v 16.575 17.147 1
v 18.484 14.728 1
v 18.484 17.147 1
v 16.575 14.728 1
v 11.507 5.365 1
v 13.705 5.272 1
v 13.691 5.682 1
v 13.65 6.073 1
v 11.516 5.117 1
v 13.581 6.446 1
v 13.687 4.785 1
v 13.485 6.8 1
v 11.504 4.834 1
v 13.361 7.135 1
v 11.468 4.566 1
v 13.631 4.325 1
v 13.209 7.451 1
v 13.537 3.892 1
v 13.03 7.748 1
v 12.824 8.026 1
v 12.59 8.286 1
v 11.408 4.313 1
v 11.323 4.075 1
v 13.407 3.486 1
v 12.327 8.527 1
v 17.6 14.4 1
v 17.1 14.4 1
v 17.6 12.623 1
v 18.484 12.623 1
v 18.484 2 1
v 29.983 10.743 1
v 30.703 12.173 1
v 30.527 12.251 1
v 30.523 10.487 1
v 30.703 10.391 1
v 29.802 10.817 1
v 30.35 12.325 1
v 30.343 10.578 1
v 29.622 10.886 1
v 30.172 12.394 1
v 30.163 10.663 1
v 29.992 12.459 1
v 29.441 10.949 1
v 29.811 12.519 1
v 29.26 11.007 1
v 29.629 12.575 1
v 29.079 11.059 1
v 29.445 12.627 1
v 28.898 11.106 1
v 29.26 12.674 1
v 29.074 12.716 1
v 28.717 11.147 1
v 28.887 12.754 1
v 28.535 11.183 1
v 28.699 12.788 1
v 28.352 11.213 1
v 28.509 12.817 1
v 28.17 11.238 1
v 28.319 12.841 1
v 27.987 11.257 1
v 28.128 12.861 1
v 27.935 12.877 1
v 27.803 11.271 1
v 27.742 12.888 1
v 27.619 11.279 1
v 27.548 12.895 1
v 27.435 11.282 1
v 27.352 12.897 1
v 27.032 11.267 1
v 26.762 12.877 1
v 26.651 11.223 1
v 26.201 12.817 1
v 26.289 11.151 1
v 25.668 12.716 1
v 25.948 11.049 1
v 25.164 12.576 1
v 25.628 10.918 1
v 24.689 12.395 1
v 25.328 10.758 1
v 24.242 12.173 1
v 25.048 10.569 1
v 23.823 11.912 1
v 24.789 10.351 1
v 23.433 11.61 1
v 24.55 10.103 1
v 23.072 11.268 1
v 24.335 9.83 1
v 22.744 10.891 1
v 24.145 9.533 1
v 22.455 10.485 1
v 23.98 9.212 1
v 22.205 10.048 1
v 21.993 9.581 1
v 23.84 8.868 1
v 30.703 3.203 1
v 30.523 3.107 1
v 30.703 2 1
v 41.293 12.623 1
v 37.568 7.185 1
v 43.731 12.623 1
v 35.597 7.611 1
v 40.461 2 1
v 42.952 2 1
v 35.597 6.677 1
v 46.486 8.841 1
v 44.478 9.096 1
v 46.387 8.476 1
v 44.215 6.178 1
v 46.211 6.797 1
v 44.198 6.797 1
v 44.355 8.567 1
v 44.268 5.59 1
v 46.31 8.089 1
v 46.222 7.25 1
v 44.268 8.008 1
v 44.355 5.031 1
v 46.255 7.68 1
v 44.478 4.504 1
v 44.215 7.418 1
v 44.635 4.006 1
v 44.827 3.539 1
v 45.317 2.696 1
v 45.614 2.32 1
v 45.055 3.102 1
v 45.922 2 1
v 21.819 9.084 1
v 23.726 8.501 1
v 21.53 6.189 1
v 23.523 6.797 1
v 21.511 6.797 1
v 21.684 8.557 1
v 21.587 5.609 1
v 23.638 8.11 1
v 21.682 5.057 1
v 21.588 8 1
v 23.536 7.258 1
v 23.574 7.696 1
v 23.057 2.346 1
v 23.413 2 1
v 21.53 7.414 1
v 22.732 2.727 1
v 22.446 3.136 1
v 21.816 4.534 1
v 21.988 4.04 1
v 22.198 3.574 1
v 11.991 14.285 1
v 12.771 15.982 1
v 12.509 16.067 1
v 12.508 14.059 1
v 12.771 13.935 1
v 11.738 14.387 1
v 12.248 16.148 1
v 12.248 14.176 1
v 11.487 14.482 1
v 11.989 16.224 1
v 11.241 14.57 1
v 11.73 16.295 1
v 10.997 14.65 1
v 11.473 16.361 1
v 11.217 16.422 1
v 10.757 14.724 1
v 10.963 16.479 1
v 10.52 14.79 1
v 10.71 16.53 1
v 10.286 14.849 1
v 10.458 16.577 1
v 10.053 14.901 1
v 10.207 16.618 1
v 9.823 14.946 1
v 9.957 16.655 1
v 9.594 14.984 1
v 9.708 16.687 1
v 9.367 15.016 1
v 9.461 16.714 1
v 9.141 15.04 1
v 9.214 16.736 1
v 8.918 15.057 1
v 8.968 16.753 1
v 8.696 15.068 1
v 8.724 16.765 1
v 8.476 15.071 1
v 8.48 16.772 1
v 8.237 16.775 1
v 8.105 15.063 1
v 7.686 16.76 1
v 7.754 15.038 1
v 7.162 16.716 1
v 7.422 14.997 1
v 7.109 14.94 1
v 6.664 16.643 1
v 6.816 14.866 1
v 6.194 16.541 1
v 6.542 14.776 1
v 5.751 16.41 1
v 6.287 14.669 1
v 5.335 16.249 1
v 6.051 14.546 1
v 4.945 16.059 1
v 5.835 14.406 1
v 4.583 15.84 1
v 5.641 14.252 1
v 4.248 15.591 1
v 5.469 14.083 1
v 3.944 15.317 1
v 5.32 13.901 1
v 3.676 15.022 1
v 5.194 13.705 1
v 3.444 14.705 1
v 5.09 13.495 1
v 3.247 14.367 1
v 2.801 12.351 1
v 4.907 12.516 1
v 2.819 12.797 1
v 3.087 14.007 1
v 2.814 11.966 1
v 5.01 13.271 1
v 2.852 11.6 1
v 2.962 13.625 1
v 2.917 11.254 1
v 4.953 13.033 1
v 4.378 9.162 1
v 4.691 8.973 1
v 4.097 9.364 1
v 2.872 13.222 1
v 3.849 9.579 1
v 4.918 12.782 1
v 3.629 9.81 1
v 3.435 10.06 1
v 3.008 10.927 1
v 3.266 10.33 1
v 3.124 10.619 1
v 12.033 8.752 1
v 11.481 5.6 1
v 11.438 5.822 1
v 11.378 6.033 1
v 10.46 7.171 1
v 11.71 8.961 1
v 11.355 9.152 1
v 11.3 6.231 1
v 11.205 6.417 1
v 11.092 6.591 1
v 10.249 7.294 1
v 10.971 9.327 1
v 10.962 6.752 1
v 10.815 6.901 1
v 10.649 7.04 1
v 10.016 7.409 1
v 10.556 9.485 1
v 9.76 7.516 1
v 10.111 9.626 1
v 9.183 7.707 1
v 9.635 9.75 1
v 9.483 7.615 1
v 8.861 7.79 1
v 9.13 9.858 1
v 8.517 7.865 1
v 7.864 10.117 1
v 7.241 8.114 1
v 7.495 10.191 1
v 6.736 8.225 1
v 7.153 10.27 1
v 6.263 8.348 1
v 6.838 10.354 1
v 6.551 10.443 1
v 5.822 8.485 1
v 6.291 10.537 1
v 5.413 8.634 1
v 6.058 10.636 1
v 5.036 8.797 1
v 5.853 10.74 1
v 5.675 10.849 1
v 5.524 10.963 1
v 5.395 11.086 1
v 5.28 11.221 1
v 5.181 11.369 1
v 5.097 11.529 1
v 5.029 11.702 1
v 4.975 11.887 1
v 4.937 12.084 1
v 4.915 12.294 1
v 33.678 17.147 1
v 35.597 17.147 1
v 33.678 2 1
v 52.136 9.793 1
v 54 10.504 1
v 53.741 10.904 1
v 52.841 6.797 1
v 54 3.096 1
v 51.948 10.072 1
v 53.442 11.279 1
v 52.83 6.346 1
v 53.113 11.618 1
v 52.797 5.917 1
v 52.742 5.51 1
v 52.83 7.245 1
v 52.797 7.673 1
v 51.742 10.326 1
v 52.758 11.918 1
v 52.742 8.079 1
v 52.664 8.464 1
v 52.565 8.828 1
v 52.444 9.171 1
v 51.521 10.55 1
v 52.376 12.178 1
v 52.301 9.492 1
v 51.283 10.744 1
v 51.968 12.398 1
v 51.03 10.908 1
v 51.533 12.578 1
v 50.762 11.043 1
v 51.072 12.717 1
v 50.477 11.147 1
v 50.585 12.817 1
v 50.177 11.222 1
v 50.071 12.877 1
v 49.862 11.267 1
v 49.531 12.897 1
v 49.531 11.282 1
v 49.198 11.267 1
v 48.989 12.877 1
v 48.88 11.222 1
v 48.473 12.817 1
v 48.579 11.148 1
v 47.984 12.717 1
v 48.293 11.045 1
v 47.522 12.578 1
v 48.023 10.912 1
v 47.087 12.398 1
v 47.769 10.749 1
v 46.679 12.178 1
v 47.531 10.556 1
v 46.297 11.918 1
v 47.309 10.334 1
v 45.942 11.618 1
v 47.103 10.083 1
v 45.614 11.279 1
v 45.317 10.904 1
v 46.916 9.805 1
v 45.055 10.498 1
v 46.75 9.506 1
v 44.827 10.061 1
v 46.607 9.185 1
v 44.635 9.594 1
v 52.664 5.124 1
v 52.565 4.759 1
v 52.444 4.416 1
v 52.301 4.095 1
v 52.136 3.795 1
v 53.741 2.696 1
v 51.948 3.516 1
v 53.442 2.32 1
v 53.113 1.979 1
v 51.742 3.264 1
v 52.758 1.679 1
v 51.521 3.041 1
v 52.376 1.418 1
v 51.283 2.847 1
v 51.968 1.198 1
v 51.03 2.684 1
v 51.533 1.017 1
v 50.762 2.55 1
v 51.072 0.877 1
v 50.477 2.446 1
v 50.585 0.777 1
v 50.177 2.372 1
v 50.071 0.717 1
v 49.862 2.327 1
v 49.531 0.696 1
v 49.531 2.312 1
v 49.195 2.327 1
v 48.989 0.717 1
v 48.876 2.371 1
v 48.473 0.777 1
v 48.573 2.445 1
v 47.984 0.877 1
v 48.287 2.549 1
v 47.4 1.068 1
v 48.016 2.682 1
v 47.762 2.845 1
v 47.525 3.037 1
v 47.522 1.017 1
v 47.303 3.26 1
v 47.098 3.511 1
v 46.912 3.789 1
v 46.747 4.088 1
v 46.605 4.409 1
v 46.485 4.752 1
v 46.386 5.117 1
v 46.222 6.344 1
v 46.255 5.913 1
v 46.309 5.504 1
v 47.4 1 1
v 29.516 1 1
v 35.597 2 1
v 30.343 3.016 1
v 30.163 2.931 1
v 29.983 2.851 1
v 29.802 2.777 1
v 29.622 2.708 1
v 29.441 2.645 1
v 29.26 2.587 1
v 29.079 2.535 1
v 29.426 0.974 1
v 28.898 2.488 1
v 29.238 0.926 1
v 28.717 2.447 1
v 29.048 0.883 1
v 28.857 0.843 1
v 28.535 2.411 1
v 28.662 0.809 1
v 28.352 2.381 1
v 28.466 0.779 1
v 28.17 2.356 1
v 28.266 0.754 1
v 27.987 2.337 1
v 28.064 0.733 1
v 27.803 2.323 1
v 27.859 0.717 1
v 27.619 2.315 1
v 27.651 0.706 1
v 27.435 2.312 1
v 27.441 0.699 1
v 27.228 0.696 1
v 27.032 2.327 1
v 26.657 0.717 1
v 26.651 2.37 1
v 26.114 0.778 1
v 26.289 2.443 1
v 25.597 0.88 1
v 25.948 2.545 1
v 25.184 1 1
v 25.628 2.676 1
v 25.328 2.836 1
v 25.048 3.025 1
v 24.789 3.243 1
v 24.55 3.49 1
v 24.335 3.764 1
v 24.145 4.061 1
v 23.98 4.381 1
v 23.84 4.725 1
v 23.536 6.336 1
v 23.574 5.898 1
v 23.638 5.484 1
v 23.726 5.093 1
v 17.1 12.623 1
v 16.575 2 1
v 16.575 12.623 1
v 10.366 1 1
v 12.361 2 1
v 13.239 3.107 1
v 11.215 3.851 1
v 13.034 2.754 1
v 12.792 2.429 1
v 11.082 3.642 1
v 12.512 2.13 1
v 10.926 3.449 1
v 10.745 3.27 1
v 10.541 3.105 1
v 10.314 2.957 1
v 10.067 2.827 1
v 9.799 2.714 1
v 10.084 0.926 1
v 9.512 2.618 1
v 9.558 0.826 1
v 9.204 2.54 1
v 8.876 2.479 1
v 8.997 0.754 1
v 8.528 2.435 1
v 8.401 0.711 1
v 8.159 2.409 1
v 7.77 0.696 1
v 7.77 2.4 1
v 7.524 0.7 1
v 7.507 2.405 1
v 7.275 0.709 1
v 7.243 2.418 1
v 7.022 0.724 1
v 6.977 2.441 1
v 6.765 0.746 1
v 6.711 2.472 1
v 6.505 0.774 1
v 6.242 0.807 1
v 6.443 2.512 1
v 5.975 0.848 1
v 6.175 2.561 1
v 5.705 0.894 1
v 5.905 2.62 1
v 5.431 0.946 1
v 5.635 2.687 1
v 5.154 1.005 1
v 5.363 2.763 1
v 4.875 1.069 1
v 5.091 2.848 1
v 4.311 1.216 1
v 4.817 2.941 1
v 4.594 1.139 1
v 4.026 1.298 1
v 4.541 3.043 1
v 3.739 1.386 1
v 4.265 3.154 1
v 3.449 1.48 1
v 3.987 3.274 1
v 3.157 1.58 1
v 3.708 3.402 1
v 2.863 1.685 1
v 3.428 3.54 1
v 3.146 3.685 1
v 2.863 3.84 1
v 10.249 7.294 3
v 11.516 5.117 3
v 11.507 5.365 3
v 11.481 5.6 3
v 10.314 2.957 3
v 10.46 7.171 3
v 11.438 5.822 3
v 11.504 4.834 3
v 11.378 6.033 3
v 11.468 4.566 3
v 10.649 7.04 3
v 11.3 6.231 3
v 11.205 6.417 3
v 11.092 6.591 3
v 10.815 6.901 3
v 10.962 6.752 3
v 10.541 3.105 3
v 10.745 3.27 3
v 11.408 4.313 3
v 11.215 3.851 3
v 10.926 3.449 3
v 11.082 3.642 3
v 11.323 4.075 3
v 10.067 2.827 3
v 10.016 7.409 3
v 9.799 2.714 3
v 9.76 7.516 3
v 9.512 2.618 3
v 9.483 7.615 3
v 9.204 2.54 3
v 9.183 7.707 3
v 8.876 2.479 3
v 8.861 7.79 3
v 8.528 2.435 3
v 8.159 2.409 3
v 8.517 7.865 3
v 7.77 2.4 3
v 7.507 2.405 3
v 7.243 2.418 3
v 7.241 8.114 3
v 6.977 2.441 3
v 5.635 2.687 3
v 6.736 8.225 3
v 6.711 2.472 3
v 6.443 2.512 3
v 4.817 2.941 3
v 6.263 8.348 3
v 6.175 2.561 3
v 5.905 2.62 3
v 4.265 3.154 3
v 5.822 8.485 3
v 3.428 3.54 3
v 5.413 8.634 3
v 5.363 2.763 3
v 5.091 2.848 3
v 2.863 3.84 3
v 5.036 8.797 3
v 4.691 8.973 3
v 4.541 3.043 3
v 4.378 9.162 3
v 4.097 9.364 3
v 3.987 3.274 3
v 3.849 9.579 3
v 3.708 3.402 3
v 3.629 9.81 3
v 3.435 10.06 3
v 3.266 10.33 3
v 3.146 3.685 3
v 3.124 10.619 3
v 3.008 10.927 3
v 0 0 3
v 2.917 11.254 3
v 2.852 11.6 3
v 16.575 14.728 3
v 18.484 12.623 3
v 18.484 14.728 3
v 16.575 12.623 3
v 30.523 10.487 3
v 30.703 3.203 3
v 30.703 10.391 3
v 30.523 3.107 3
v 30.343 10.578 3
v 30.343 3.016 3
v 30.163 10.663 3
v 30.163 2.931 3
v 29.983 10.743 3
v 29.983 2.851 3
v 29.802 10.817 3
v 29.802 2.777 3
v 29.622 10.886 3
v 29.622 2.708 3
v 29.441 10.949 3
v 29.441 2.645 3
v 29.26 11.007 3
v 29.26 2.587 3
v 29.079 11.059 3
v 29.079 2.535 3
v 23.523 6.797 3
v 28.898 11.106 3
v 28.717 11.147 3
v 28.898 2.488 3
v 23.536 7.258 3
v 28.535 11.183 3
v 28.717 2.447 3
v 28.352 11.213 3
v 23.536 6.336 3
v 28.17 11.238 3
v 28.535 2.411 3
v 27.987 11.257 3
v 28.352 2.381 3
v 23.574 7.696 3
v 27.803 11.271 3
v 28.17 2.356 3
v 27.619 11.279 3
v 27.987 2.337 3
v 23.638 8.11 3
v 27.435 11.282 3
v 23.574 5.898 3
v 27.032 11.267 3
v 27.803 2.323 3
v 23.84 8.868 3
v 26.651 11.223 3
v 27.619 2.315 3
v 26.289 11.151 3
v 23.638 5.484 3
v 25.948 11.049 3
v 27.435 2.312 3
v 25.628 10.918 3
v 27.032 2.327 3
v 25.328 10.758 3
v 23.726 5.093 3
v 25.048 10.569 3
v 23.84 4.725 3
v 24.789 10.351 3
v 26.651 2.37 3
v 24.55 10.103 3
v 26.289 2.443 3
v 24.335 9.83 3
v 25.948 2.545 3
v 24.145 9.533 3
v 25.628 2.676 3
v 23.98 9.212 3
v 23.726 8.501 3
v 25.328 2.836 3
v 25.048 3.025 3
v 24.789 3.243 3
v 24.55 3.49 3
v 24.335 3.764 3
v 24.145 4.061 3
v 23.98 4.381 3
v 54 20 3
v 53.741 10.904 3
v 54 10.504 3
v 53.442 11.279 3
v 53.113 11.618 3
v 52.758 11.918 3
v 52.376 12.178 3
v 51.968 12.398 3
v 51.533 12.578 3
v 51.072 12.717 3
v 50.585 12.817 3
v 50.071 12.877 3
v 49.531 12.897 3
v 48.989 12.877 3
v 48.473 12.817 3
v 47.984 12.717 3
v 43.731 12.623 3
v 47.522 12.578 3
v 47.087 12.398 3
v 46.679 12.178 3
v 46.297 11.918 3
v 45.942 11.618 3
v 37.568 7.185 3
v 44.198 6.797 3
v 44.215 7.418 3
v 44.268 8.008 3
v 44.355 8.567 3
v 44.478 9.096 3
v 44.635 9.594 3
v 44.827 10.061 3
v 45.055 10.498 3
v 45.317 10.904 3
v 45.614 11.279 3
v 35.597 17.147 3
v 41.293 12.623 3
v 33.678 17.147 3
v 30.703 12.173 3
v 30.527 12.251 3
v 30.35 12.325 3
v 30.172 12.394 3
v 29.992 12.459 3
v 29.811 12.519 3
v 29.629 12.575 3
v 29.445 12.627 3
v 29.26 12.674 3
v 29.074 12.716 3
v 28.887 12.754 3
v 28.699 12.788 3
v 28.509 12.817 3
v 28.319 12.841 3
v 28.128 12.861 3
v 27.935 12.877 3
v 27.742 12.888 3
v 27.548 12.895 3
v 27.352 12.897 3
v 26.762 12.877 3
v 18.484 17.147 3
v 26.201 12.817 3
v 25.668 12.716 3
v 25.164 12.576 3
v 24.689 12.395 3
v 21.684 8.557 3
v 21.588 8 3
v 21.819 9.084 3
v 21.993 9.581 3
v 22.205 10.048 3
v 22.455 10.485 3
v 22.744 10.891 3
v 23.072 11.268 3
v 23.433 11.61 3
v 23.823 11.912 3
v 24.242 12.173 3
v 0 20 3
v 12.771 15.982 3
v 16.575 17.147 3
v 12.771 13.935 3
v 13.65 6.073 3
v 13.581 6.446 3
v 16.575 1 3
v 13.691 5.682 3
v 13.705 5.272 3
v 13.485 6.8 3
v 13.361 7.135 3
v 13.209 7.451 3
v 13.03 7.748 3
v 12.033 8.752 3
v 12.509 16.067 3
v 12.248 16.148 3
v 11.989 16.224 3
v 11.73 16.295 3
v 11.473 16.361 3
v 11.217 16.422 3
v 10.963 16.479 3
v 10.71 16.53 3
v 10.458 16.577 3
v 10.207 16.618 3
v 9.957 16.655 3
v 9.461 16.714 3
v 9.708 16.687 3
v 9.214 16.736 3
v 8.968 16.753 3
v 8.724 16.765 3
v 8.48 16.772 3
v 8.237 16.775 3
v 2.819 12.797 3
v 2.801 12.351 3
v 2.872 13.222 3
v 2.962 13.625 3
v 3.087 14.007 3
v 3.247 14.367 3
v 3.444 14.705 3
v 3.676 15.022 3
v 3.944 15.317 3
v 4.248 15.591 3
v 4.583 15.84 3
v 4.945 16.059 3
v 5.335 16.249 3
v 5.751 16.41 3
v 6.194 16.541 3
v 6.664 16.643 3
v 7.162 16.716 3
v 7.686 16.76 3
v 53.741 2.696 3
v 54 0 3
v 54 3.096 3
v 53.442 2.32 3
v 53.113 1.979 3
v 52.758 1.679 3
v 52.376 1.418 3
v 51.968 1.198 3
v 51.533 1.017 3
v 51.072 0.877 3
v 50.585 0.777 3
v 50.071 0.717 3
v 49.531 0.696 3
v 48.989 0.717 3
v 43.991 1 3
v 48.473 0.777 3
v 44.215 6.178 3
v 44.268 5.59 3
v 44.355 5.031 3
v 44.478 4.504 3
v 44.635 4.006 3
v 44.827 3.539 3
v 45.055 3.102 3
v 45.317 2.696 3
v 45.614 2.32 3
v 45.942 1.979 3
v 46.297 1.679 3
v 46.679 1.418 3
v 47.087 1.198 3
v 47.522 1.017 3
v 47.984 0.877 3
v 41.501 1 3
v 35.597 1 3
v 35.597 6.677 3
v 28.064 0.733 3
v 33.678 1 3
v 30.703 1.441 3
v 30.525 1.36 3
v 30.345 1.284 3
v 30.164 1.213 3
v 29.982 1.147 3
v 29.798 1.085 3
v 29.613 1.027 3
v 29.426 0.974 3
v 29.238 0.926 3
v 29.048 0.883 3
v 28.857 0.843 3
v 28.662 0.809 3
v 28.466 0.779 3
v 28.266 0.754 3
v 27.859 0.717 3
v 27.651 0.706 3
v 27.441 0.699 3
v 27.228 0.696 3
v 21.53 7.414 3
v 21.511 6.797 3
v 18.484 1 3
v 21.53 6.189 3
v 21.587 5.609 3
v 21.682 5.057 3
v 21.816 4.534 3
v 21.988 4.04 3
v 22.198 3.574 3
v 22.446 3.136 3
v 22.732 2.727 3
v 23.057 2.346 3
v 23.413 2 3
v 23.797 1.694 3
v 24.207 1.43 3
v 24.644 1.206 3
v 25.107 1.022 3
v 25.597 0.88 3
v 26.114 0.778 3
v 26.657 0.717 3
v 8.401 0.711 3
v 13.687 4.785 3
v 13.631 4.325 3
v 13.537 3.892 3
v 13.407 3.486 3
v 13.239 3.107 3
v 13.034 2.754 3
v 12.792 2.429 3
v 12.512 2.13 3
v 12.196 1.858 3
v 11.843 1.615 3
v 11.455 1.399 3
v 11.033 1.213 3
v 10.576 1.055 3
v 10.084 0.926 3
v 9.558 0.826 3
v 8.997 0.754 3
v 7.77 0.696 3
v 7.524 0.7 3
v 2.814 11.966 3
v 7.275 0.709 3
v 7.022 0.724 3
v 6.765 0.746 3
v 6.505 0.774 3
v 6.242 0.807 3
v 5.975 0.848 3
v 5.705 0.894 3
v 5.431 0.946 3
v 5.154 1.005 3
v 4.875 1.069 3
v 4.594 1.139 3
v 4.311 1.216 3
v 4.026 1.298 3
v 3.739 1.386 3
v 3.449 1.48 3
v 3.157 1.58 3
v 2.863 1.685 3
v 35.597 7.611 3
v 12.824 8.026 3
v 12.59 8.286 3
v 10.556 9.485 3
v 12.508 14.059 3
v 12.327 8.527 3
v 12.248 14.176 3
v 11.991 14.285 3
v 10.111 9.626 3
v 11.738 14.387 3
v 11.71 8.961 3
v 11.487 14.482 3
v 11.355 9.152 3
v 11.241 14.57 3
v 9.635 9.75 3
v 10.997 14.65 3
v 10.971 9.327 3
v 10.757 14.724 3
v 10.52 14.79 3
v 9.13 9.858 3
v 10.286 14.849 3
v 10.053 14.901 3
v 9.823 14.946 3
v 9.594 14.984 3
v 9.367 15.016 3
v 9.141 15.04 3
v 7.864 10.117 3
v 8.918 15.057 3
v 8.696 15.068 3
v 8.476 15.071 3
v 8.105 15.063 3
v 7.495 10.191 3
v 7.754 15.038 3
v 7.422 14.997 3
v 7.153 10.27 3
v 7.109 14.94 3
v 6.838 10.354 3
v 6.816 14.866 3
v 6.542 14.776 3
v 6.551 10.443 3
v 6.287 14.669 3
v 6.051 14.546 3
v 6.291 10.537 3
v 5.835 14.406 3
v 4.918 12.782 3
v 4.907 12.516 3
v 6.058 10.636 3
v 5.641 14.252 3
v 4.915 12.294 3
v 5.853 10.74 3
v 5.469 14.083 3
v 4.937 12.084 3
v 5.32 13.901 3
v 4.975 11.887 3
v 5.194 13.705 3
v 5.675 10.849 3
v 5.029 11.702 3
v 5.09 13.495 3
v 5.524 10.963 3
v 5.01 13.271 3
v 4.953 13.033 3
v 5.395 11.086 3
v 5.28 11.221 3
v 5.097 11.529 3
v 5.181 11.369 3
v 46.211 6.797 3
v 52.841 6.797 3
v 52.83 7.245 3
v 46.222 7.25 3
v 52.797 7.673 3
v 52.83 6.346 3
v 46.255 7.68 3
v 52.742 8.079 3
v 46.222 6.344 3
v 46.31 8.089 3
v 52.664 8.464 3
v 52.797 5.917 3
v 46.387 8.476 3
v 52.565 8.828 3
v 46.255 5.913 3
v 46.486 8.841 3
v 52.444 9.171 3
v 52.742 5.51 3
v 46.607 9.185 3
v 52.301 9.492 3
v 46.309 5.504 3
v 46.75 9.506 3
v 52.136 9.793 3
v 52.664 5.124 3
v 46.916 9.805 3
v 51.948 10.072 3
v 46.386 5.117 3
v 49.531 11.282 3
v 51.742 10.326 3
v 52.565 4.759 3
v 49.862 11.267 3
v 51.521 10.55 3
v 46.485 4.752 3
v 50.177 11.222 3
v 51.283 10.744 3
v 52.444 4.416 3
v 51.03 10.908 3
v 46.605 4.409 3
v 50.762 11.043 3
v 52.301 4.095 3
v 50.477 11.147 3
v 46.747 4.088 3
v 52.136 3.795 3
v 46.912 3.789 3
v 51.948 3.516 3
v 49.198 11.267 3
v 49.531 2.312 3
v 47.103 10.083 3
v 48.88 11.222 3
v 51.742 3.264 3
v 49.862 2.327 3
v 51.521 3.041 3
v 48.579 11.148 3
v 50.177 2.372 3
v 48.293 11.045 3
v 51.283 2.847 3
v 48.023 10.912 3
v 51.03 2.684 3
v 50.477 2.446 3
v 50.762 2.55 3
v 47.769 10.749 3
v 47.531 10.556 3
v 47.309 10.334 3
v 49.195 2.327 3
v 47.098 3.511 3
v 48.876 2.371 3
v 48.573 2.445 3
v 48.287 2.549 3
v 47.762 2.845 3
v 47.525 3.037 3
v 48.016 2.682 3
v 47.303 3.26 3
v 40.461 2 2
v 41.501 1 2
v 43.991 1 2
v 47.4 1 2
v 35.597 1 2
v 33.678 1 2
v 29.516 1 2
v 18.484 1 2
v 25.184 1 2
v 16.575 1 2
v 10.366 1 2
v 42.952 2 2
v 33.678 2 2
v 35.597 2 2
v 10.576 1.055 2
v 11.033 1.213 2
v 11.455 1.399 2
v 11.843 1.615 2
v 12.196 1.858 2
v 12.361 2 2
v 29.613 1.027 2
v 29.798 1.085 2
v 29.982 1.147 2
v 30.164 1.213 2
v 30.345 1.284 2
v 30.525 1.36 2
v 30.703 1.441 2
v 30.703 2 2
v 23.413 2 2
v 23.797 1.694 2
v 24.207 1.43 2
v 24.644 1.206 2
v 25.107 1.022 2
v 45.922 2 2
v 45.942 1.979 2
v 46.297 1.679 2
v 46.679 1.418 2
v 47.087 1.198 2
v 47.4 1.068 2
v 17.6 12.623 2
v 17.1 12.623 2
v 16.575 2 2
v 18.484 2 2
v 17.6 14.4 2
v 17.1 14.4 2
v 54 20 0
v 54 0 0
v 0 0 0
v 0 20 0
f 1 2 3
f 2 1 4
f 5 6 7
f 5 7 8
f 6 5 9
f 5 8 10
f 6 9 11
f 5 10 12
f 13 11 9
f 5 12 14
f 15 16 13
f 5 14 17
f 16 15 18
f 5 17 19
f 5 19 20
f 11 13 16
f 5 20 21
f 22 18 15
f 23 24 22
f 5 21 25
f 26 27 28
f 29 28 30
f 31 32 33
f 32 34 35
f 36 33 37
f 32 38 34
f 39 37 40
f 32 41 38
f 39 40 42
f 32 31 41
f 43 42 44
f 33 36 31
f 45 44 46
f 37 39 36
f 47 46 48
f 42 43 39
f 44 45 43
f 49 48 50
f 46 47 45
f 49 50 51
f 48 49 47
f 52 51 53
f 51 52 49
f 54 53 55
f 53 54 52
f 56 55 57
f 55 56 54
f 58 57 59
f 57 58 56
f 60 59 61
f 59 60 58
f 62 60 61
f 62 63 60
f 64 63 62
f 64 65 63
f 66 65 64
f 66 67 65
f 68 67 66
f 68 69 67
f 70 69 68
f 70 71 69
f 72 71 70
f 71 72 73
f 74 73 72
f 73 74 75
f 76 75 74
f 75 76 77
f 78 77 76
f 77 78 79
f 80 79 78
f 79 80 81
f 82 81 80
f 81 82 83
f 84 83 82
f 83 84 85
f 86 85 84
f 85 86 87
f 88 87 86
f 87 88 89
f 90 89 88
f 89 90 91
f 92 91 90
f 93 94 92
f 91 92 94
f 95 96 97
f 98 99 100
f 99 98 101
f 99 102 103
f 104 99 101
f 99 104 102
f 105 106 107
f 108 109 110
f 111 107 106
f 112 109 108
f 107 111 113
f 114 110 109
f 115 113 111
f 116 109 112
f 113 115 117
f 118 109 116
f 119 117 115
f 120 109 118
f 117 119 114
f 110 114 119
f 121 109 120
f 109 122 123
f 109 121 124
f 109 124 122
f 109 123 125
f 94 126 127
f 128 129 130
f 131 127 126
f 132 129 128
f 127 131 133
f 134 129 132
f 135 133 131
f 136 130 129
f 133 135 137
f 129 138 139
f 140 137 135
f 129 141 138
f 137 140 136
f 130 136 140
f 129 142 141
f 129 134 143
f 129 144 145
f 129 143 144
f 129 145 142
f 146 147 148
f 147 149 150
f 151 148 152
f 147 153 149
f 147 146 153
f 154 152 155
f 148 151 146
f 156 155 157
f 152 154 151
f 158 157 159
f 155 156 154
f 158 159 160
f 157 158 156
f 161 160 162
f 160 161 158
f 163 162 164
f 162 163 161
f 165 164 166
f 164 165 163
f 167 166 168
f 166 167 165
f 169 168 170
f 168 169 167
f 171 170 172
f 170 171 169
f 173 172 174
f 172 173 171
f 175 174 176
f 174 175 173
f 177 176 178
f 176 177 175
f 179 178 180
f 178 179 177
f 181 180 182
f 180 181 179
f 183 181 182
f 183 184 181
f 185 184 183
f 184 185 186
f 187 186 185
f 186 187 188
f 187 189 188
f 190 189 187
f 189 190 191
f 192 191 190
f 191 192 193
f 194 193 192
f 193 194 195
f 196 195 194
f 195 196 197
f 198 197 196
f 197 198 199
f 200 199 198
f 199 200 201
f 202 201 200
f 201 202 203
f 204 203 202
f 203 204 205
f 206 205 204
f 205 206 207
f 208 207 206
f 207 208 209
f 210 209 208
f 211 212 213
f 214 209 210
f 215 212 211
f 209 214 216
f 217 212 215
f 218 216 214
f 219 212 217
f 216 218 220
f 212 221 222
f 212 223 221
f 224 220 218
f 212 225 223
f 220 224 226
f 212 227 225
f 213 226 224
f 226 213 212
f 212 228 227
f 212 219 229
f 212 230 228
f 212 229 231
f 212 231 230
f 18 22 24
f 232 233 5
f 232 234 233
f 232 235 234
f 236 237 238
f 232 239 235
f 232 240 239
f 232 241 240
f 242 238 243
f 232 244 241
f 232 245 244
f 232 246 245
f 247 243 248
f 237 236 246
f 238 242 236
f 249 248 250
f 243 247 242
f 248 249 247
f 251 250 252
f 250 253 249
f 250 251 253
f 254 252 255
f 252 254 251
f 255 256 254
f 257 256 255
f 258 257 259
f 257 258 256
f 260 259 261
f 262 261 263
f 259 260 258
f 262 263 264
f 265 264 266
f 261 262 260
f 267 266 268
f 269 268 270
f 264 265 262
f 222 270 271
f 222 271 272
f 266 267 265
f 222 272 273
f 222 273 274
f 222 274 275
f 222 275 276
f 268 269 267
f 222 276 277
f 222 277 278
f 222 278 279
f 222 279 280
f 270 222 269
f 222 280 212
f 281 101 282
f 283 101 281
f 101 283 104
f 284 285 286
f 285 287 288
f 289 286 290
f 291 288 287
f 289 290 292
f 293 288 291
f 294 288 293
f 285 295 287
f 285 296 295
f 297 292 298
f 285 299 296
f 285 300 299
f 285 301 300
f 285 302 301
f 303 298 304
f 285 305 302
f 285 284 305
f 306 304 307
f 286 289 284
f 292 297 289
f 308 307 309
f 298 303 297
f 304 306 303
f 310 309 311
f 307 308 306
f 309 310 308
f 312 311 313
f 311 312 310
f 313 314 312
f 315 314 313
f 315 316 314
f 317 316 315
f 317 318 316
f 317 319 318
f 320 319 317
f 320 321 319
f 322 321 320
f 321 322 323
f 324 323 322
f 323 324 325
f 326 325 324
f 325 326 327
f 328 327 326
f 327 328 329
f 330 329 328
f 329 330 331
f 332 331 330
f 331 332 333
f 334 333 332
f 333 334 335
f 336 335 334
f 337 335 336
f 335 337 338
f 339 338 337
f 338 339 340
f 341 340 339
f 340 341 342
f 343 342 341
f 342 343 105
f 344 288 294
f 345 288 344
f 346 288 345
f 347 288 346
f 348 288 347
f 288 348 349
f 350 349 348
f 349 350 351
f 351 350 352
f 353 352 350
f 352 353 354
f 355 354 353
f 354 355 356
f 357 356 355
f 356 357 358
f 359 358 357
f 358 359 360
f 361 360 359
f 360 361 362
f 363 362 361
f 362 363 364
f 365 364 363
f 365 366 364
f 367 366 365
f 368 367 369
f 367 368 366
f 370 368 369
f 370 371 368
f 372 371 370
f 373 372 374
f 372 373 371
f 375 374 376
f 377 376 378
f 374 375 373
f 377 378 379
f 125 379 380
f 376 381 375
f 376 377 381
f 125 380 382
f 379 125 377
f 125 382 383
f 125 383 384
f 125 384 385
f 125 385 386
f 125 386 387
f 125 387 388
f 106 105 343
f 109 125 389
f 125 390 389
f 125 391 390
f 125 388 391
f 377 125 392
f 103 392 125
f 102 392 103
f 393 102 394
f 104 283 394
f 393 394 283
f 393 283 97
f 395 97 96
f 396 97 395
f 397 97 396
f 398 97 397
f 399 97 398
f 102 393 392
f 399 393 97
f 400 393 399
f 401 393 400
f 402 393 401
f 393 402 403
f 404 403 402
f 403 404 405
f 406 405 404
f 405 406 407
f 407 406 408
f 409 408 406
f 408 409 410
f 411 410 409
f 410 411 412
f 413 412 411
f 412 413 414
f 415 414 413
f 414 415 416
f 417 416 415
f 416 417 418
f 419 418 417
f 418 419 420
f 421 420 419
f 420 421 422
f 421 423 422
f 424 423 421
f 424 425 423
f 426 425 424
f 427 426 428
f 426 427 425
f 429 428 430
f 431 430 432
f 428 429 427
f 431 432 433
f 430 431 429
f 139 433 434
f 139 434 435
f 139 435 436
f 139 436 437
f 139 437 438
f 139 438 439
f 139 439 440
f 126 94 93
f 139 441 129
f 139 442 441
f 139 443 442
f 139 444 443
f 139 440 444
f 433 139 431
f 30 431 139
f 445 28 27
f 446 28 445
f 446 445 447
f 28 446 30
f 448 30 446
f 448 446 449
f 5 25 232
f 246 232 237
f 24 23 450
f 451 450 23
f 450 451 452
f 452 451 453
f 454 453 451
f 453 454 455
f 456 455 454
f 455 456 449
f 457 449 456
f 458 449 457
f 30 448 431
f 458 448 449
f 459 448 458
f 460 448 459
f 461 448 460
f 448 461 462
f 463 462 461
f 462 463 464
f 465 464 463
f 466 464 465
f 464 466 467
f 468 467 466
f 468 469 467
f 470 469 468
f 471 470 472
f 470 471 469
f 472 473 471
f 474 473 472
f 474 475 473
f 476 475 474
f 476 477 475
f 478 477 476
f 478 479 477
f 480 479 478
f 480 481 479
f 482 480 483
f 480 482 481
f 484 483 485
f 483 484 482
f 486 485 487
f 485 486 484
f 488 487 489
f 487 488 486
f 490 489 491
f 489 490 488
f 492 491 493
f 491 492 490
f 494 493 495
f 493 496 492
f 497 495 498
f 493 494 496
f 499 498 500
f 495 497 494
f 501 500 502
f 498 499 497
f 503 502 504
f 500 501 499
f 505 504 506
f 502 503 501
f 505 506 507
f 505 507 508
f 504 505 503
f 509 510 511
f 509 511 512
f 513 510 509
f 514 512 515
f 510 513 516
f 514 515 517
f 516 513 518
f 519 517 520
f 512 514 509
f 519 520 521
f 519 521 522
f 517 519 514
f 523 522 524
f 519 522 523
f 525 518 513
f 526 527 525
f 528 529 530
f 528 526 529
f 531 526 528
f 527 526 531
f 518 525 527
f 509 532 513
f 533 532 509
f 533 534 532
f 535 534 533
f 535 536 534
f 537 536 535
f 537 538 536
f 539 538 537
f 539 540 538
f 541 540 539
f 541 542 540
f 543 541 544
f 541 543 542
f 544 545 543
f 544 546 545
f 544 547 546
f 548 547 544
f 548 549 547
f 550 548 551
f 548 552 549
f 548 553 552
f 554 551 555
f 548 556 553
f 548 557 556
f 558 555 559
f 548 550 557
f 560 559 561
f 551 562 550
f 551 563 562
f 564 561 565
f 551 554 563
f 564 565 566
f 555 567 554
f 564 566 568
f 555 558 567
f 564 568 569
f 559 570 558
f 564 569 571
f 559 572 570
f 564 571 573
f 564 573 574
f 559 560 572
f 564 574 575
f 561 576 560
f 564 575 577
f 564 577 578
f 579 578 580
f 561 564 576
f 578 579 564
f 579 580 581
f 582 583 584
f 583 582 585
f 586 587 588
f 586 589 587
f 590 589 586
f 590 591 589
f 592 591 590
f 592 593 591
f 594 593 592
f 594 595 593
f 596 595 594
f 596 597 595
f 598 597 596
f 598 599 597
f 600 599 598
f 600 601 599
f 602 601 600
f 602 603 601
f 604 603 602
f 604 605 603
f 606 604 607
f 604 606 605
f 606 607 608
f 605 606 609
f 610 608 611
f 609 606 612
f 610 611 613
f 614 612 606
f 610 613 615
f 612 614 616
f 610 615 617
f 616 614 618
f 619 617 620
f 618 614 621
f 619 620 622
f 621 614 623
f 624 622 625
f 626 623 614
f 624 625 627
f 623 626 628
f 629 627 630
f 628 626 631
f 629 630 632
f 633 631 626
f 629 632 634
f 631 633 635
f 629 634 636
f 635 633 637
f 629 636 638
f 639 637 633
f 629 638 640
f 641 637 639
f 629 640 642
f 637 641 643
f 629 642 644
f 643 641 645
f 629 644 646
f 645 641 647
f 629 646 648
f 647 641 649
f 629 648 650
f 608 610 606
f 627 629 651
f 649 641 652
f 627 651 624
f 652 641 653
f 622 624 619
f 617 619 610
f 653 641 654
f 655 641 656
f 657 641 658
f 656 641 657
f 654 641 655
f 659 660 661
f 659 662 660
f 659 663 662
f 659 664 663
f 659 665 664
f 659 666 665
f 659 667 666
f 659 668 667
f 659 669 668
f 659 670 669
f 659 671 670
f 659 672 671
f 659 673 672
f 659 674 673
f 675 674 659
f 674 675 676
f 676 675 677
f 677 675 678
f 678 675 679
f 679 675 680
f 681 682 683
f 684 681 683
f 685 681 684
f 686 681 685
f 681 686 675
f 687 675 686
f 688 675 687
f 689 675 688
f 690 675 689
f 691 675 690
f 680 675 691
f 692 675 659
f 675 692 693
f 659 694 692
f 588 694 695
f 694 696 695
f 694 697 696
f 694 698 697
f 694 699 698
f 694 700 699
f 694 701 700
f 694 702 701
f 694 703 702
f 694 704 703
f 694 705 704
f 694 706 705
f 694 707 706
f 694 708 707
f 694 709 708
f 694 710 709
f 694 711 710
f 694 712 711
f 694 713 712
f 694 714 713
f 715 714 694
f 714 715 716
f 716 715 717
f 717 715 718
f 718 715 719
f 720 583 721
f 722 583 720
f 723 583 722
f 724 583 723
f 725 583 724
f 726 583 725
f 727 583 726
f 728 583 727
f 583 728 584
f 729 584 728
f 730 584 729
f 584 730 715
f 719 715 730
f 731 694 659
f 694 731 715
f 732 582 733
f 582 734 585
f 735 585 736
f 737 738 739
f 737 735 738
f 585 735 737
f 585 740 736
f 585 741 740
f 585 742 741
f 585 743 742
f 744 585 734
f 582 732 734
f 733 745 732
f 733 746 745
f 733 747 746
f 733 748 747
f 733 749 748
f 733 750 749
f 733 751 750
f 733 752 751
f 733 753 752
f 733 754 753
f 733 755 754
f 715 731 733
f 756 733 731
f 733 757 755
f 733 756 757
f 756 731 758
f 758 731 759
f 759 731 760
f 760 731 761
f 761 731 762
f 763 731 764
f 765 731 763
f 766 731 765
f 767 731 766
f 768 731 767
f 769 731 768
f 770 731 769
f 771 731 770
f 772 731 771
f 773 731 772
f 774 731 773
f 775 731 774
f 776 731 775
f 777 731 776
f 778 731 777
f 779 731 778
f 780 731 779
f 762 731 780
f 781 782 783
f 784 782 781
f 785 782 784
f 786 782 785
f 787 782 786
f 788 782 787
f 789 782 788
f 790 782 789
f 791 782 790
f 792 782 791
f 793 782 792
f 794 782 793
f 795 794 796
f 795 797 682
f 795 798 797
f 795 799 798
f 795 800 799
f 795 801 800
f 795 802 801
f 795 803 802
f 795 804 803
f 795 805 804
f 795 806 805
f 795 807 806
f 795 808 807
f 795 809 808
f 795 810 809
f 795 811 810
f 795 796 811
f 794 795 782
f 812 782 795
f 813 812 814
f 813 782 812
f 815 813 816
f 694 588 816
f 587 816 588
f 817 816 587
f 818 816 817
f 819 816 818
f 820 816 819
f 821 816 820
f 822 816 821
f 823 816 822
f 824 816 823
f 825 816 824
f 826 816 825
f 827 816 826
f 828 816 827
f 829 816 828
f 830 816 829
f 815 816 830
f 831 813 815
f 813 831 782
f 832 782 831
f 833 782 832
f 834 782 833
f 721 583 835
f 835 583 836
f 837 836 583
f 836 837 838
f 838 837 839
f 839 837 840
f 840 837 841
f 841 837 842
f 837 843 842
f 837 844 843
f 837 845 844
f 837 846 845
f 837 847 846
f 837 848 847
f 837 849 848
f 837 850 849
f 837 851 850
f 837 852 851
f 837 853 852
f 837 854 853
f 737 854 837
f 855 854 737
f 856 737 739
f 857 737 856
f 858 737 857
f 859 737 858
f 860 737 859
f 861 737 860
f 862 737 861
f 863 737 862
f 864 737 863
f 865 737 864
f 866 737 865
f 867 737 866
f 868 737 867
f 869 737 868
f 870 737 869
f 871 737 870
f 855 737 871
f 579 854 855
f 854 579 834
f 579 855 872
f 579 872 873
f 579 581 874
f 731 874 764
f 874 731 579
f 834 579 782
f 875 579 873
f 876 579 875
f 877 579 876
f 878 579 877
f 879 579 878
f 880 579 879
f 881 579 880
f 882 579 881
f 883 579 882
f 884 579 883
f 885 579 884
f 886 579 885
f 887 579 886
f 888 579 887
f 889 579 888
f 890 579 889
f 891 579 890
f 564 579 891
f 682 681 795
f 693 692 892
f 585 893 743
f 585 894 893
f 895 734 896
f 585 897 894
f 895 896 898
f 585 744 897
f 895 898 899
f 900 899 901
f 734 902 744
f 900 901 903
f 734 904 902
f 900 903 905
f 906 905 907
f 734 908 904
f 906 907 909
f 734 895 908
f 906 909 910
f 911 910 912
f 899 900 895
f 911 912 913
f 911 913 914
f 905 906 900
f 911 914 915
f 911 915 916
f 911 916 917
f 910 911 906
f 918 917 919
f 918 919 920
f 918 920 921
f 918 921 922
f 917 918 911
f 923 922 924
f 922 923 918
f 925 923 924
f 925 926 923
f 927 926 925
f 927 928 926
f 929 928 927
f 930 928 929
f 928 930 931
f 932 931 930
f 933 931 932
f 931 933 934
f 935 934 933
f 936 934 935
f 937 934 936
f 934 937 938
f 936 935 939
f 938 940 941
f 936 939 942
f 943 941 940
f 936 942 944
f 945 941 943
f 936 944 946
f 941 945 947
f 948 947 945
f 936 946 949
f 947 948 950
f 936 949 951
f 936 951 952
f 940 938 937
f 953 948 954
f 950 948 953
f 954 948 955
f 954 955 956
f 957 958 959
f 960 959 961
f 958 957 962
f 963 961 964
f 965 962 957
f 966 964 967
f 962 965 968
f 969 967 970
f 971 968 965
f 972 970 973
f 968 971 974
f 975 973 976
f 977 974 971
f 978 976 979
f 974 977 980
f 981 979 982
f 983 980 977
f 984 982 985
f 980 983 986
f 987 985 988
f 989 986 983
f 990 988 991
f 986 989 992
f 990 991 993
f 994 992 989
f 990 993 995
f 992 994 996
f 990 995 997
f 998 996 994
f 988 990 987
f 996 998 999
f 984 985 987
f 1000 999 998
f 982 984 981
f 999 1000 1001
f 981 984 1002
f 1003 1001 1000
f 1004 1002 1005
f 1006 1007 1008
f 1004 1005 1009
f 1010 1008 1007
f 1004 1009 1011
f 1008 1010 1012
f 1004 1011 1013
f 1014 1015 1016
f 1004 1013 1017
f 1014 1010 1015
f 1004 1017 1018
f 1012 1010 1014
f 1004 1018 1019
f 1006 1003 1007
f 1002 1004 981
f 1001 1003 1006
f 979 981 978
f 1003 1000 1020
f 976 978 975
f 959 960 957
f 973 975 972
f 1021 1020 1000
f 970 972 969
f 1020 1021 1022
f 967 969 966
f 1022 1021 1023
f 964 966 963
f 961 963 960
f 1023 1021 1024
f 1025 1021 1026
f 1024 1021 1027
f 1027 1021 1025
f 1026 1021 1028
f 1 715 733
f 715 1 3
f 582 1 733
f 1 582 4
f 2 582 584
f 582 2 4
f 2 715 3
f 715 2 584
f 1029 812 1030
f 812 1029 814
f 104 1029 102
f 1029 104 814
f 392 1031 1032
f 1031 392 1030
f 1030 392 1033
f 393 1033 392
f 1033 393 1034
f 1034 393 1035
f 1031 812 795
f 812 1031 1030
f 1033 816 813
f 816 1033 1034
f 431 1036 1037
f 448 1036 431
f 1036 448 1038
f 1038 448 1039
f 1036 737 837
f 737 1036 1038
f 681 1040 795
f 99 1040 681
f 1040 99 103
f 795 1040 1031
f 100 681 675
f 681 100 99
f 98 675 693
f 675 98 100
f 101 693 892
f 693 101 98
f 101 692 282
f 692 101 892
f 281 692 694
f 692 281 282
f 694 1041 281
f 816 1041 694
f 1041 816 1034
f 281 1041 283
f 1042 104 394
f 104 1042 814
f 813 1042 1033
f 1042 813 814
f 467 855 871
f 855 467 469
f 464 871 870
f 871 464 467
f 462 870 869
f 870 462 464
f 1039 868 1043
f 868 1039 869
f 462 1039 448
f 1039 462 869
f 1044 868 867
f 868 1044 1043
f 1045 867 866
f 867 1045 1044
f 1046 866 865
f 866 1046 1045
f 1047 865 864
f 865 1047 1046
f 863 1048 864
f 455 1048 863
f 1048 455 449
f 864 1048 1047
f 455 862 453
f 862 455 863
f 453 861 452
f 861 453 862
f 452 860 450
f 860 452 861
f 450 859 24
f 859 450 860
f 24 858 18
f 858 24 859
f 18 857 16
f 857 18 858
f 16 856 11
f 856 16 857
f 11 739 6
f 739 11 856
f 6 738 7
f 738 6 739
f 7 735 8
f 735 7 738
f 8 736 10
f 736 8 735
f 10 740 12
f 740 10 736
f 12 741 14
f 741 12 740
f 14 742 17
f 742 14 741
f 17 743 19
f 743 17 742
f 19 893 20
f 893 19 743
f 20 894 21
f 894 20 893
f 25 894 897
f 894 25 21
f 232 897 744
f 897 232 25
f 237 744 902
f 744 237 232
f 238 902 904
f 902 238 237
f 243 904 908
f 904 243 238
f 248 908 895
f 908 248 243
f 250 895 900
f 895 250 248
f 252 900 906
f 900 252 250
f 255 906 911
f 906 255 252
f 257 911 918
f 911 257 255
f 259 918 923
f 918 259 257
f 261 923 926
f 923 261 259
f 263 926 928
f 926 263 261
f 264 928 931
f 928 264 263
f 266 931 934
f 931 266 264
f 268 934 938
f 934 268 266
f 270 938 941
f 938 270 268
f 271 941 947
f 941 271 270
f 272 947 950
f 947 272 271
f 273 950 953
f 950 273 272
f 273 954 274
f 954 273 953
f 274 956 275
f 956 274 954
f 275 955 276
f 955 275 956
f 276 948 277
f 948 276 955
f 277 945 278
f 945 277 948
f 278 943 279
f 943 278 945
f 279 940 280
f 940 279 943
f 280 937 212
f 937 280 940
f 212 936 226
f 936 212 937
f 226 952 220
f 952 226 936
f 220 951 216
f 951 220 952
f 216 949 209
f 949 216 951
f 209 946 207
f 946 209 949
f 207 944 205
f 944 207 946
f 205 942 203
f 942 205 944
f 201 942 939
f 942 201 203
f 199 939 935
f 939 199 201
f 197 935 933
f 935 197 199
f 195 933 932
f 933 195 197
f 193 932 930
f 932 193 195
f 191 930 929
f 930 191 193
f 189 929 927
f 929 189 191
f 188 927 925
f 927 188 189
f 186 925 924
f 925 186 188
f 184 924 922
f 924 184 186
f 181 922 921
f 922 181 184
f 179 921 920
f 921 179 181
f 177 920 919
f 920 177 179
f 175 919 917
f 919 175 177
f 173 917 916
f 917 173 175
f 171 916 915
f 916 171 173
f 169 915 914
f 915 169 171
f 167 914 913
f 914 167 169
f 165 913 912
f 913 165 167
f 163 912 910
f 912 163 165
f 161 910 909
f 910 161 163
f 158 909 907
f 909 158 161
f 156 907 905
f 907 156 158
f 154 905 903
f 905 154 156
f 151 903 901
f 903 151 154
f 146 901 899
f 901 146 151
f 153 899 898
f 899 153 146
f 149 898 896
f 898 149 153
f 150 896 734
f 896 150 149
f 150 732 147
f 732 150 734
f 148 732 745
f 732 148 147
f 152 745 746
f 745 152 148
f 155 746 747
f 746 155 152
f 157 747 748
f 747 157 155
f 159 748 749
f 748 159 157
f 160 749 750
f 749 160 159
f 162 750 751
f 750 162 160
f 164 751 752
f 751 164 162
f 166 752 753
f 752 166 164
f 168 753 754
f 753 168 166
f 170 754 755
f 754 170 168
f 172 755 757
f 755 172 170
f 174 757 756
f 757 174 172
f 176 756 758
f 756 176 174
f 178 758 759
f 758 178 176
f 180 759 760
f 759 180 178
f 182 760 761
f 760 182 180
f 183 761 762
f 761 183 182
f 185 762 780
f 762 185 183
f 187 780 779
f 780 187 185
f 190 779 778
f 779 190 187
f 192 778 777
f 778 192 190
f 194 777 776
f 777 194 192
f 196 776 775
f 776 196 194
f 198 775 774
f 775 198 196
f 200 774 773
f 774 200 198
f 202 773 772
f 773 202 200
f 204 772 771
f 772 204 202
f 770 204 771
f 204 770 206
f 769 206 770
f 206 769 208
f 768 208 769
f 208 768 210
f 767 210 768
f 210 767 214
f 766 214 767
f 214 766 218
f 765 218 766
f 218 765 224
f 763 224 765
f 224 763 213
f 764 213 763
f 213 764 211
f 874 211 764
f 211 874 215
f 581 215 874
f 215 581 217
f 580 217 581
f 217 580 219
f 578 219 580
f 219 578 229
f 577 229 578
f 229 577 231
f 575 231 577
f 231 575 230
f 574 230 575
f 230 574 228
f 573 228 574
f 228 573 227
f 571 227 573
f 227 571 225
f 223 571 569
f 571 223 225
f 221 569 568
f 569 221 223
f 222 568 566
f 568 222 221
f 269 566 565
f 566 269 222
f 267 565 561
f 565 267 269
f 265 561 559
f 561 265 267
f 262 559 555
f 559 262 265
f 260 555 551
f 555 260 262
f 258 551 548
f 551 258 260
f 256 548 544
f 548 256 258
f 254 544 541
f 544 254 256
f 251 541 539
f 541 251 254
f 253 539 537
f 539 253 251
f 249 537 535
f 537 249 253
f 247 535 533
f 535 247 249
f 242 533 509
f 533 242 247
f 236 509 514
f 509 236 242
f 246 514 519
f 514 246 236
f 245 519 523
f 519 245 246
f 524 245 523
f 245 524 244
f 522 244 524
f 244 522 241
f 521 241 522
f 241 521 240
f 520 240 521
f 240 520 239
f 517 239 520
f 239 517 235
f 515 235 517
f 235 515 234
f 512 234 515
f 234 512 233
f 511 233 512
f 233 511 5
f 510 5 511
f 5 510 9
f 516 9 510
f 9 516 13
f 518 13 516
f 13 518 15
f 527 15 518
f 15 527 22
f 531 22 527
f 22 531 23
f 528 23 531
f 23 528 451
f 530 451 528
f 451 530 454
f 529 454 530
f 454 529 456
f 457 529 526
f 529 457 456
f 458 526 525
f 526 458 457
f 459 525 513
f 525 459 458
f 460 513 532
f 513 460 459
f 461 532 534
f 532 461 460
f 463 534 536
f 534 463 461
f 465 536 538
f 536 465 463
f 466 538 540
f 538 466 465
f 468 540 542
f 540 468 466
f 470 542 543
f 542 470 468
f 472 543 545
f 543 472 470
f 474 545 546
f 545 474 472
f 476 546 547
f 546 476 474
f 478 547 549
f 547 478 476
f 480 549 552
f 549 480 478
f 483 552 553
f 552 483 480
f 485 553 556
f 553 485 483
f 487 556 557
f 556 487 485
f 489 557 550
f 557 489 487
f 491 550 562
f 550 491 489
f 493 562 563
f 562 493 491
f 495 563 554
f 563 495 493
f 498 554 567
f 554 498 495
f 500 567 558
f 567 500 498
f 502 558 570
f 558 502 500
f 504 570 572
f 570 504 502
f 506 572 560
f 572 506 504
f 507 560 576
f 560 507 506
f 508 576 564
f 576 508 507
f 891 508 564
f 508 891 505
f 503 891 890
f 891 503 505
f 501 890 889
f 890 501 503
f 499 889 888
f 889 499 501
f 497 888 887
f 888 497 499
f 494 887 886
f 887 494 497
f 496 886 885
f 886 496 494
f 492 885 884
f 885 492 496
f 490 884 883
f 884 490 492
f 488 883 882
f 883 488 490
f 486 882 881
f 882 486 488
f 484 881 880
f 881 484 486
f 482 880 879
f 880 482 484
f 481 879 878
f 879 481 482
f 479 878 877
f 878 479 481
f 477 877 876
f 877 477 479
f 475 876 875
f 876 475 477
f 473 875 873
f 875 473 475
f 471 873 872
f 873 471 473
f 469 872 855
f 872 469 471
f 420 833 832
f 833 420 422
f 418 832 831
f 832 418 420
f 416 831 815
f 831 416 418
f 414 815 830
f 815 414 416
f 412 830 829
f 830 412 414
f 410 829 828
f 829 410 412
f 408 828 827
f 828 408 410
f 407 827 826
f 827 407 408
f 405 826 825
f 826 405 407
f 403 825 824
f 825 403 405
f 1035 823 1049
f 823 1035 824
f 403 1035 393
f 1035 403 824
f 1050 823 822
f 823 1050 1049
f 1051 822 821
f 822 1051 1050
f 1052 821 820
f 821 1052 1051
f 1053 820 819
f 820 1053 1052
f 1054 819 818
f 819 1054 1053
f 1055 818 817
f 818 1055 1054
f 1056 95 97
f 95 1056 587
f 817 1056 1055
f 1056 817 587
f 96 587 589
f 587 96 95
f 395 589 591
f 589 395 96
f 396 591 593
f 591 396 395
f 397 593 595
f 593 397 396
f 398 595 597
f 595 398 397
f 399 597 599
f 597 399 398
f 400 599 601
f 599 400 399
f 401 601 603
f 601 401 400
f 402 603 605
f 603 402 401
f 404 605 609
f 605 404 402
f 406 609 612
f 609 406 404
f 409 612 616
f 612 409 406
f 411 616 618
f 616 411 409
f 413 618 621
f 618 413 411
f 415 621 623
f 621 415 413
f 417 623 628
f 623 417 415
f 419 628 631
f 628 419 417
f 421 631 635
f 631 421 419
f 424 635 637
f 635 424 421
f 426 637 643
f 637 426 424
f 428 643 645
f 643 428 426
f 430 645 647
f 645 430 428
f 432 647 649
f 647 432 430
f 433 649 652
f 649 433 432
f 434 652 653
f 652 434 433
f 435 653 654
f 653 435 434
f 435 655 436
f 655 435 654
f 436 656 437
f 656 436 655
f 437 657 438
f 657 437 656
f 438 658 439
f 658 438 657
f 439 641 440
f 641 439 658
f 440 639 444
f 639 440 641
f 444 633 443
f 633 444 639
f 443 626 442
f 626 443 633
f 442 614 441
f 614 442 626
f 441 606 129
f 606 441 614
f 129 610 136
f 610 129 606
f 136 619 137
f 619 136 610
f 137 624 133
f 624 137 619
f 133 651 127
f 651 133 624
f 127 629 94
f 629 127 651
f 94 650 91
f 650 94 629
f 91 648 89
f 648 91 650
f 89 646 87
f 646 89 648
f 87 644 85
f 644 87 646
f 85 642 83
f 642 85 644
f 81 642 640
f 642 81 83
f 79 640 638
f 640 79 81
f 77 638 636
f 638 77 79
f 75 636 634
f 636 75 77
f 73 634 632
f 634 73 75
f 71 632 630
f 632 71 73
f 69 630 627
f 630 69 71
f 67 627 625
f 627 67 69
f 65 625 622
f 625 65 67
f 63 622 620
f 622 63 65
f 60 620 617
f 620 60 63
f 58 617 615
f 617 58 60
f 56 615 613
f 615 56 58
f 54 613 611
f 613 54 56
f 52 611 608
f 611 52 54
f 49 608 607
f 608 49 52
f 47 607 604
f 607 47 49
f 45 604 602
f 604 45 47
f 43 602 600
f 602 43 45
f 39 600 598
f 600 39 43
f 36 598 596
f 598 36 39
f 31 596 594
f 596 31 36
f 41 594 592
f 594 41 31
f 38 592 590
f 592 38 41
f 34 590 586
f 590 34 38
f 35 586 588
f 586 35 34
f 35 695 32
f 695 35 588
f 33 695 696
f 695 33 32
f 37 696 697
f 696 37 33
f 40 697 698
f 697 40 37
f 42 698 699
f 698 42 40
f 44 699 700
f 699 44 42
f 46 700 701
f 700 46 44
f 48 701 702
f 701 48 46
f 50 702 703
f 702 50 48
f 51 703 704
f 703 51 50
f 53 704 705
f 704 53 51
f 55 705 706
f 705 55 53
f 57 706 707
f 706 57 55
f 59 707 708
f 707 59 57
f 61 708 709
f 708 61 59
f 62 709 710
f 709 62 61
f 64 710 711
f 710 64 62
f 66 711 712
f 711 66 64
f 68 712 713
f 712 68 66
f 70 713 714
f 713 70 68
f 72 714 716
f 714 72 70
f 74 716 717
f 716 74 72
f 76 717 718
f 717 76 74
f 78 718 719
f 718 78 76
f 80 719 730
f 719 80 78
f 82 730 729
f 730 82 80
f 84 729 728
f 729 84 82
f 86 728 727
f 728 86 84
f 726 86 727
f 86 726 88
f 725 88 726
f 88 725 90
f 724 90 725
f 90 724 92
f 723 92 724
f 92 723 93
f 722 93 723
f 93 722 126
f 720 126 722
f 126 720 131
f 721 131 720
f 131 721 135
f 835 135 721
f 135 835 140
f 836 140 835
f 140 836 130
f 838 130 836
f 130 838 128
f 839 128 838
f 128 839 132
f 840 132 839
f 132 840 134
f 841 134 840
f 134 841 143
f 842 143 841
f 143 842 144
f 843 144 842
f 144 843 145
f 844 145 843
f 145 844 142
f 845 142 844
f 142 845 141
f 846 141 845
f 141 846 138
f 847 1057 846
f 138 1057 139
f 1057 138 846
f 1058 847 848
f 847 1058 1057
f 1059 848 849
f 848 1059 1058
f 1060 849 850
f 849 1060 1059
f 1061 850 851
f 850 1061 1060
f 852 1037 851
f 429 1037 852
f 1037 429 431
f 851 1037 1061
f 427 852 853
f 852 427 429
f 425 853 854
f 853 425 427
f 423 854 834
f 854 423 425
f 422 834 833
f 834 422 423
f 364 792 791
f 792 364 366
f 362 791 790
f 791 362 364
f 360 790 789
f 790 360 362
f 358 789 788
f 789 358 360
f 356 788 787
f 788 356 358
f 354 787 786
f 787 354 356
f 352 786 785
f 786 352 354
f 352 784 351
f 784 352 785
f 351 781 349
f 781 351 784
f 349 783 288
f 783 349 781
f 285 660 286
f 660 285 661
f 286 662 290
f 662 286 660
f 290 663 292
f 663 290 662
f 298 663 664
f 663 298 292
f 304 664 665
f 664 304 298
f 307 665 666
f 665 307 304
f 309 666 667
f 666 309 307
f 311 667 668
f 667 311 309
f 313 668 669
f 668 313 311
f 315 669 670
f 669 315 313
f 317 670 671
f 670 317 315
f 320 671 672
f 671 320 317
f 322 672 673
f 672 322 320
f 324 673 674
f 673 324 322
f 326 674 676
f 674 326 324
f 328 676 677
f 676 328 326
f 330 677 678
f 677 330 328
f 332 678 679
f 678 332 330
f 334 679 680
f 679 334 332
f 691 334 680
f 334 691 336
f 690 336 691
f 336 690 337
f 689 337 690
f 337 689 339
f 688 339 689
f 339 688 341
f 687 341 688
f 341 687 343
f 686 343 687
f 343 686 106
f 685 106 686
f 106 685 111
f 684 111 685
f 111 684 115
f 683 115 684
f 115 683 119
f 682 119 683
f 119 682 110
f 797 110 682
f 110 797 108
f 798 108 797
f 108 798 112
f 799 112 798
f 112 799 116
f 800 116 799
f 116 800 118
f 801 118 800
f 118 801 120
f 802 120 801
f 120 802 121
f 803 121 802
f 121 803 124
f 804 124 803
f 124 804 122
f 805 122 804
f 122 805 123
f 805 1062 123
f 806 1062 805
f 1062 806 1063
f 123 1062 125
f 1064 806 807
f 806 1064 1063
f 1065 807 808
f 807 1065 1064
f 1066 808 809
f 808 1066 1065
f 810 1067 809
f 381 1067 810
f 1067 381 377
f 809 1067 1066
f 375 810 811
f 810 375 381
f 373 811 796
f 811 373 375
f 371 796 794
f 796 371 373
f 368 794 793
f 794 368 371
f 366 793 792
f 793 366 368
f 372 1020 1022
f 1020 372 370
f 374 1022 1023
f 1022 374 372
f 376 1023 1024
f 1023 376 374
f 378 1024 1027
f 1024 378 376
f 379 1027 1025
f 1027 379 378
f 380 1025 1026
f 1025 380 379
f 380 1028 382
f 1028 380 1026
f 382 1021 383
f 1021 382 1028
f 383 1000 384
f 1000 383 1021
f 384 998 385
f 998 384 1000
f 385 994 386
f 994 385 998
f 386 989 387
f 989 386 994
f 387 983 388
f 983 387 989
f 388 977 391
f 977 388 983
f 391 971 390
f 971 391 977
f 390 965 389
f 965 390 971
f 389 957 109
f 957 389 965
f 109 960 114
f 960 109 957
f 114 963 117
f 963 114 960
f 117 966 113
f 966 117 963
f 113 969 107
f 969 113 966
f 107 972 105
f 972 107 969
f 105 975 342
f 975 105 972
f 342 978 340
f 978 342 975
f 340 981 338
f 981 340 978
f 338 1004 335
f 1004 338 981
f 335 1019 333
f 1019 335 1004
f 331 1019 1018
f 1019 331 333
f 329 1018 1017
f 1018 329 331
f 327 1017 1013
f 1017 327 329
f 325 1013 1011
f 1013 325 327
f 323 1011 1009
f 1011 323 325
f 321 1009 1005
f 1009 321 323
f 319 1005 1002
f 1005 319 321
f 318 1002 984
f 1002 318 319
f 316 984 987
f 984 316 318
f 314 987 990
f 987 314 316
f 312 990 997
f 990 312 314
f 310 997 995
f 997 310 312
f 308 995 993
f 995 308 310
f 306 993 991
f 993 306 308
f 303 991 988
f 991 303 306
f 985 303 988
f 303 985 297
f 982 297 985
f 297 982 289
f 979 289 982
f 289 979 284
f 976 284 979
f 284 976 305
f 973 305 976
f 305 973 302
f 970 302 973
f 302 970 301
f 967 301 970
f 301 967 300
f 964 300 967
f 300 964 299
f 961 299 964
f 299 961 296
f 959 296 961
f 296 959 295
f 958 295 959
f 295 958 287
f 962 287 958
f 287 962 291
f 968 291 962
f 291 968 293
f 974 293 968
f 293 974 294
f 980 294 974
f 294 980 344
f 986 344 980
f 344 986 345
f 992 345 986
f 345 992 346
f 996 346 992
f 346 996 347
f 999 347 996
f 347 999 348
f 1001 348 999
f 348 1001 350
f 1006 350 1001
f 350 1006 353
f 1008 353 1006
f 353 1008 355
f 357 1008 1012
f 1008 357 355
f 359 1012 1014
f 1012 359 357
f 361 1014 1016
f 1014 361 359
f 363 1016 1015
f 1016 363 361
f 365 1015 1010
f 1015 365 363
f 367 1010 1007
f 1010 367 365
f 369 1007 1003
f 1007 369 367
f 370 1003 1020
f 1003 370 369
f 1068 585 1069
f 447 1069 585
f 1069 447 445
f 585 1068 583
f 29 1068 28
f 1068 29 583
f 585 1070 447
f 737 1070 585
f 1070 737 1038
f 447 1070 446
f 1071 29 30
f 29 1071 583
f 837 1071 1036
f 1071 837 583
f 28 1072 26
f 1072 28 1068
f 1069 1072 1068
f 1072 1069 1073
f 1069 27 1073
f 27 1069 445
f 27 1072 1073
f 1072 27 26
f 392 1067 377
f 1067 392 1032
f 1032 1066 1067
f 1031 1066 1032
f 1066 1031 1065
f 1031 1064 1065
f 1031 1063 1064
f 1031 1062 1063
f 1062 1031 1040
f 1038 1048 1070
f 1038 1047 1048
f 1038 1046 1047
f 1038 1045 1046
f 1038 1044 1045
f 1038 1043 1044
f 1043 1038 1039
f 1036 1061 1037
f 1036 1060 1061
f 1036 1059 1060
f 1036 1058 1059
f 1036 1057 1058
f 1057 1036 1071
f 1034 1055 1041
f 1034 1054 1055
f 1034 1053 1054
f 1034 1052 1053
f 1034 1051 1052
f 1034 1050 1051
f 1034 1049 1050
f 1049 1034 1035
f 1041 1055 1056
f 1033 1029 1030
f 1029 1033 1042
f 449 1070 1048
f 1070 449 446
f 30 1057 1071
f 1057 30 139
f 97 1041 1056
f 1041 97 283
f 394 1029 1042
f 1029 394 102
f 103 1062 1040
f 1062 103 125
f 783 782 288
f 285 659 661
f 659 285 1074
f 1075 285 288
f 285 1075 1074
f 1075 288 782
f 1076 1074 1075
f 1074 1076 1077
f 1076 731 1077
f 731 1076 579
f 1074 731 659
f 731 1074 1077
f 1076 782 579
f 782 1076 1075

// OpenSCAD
$fn = $preview ? 16 : 64;

font="Copperplate Normal";
name="Sicko";

difference() {
    cube([54,20,3]);
    translate([1.4, 1, 1]) {
        linear_extrude(2)
            text(name,font=font,size=15.3);
        translate([15.7,10.4,0])
            cube([0.5,3,1]);
        translate([4,0,0])
            cube([42,1,1]);
    }
}
